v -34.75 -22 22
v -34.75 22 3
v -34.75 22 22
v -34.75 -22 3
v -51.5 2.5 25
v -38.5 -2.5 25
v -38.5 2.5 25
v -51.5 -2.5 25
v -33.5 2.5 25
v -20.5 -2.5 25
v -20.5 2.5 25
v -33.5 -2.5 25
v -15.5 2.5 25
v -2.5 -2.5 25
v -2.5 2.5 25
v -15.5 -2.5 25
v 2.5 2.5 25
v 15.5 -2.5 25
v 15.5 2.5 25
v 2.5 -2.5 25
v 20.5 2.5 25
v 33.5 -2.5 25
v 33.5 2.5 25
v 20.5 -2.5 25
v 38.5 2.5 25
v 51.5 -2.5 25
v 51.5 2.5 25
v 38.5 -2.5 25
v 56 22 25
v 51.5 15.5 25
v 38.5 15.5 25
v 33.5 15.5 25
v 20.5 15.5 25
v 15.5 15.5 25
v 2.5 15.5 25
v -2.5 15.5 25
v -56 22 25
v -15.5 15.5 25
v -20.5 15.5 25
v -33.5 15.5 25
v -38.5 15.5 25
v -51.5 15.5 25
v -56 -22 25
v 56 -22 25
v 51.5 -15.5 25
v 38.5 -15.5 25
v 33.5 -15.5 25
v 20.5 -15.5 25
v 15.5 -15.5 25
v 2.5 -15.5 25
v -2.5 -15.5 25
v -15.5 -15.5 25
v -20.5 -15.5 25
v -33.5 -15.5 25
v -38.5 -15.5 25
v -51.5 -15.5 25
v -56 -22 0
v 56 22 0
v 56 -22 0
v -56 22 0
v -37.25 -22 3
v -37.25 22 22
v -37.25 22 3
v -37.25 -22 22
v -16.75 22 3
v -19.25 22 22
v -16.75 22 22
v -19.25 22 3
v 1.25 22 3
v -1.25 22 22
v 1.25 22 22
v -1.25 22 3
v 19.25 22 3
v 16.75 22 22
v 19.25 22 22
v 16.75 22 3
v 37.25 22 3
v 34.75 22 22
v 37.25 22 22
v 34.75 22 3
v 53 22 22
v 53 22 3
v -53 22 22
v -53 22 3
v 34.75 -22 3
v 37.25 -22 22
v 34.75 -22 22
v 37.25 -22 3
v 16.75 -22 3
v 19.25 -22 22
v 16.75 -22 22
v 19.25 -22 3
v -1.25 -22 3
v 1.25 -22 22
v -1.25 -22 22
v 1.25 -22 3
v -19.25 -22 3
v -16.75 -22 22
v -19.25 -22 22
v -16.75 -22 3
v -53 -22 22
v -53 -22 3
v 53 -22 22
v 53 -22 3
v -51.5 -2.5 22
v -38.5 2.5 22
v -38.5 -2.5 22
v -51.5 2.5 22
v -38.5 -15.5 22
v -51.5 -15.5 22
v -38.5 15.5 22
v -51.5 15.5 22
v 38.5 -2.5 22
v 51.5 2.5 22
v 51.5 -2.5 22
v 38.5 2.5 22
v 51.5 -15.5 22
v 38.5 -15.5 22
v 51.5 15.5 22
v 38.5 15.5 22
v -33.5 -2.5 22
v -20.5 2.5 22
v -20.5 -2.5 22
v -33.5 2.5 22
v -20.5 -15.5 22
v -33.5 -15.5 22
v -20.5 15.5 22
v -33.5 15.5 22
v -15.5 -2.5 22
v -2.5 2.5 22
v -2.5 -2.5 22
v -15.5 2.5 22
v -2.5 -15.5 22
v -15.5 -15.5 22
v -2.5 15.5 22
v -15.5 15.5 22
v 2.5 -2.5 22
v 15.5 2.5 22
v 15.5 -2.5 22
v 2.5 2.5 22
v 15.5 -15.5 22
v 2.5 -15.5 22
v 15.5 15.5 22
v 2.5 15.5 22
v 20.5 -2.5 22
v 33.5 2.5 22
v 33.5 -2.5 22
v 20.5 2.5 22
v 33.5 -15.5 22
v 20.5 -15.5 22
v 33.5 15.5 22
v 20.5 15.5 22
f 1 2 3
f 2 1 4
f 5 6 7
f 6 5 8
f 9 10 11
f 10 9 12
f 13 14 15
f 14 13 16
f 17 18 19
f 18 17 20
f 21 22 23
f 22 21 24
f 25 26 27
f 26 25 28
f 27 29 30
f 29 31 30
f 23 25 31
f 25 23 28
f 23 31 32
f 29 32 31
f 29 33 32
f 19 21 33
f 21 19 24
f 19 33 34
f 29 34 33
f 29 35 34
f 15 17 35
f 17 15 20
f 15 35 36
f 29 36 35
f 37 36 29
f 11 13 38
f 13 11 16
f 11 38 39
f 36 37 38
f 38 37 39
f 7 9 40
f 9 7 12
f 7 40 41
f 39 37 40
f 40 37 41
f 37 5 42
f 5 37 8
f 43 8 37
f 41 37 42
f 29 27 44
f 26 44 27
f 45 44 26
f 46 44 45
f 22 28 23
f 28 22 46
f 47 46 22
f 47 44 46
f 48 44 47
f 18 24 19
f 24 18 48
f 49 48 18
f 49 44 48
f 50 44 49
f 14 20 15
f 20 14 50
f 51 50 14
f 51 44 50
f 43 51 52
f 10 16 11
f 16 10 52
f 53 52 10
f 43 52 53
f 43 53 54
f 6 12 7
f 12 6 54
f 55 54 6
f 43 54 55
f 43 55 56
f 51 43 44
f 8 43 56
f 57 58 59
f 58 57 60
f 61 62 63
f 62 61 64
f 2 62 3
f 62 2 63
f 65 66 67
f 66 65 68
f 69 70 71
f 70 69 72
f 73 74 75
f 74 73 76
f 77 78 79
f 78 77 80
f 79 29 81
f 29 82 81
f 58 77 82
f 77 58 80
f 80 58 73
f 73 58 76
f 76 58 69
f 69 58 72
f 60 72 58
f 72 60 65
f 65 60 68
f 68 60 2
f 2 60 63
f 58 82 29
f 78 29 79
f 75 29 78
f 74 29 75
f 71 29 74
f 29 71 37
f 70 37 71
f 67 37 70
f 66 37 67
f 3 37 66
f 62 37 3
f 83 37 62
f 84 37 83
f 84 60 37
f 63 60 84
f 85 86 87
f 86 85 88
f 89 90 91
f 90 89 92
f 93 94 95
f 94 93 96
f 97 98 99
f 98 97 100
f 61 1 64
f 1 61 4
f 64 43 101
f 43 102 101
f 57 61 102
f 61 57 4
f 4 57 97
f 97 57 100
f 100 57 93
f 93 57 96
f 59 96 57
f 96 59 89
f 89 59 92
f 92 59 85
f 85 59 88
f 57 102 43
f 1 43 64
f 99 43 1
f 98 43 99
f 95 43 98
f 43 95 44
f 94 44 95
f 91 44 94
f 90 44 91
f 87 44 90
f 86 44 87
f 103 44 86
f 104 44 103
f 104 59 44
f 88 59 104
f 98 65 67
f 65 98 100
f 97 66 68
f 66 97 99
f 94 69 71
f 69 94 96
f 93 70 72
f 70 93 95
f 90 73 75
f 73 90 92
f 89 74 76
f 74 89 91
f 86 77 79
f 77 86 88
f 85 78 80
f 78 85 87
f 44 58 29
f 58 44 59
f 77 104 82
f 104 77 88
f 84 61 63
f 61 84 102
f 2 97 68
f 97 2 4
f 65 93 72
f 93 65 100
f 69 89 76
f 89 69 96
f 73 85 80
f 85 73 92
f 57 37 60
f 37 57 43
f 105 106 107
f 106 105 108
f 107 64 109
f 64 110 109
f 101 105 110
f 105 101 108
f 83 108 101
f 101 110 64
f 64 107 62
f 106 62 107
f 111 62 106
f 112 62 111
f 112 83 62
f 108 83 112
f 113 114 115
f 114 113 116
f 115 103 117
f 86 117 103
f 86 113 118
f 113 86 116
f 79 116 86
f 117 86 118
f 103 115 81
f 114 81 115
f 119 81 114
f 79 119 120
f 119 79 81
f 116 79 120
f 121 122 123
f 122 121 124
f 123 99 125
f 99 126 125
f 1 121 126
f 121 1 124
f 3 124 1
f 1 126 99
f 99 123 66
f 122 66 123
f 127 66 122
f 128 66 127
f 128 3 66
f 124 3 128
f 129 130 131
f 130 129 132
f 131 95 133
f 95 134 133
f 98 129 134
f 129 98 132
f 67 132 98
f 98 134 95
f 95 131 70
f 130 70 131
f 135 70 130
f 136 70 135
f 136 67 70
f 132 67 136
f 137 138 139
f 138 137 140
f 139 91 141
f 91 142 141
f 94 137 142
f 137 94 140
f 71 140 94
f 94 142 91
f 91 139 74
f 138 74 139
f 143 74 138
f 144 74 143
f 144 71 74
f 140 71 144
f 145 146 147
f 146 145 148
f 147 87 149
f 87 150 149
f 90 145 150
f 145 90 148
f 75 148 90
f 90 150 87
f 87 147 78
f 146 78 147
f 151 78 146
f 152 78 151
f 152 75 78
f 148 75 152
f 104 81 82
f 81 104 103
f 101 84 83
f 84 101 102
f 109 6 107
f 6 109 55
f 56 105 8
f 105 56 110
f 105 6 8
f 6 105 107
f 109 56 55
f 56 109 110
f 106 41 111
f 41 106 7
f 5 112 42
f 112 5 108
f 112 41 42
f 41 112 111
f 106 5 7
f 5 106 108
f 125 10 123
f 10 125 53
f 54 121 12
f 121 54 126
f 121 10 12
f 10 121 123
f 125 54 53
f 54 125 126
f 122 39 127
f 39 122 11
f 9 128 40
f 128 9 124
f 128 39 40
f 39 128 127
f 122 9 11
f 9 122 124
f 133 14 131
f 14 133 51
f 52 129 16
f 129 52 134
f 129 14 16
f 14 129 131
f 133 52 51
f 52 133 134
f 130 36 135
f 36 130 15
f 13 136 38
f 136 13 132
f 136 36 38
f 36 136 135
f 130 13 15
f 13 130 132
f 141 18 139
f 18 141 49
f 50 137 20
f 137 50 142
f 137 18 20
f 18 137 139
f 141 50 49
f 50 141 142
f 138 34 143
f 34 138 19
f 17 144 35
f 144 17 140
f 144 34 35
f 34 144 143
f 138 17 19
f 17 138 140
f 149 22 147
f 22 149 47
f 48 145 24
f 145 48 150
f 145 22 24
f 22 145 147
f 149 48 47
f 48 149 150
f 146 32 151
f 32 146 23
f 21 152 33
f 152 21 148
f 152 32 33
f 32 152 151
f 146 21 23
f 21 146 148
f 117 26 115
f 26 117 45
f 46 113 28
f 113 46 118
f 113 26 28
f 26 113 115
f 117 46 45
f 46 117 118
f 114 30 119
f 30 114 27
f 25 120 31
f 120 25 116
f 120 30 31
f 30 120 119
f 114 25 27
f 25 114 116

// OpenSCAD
// Cuvette Rack for 12 standard 12.5mm square cuvettes
// Designed for FDM printing, standing on the base plate.

// --- Dimensions ---
base_x      = 112.0;   // Base plate length (X)
base_y      = 44.0;    // Base plate width (Y)
base_z      = 3.0;     // Base plate thickness
deck_z_min  = 22.0;    // Bottom of deck plate (Z)
deck_z_max  = 25.0;    // Top of deck plate (Z)
wall_thick  = 3.0;     // Thickness of end walls
rib_thick   = 2.5;     // Thickness of internal ribs
wall_height = 25.0;    // Total height of walls

// Hole dimensions
hole_size   = 13.0;    // Square hole size (X and Y)
hole_pitch  = 18.0;    // Center-to-center distance for holes (X and Y)
rows        = 2;       // Number of rows (Y direction)
cols        = 6;       // Number of columns (X direction)

// Rib positions (X coordinates)
rib_x_pos   = [-36, -18, 0, 18, 36];

$fn = 64;

// --- Helper Modules ---

module base_plate() {
    translate([-base_x/2, -base_y/2, 0])
        cube([base_x, base_y, base_z]);
}

module deck_plate() {
    translate([-base_x/2, -base_y/2, deck_z_min])
        cube([base_x, base_y, deck_z_max - deck_z_min]);
}

module end_wall() {
    // Flush with short ends (Y direction)
    cube([wall_thick, base_y, wall_height]);
}

module rib() {
    // Centered ribs
    cube([rib_thick, base_y, wall_height]);
}

module hole() {
    // Square through-hole for the cuvette
    // We use a small offset to ensure it cuts through the deck cleanly
    translate([-hole_size/2, -hole_size/2, deck_z_min - 0.1])
        cube([hole_size, hole_size, (deck_z_max - deck_z_min) + 0.2]);
}

// --- Main Assembly ---

difference() {
    // Positive Geometry
    union() {
        base_plate();
        deck_plate();
        
        // End walls (flush with short ends)
        translate([base_x/2 - wall_thick, -base_y/2, 0]) end_wall();
        translate([-base_x/2, -base_y/2, 0]) end_wall();
        
        // Internal ribs
        for (x_pos = rib_x_pos) {
            translate([x_pos - rib_thick/2, -base_y/2, 0]) rib();
        }
    }

    // Negative Geometry (Holes in the deck)
    // Calculate starting position to center the grid of holes on the deck
    // The grid is (cols-1)*pitch wide. 
    // Offset = (Total Width / 2) - (Grid Width / 2)
    grid_width_x = (cols - 1) * hole_pitch;
    grid_width_y = (rows - 1) * hole_pitch;
    
    start_x = (-grid_width_x / 2) + (hole_pitch / 2); // Error in logic? No, let's use the loop below.
    
    // Corrected centering logic:
    // The center of the first hole in the grid should be at:
    // (Center of plate) - (Total distance from center to first hole center)
    // Total distance from center to first hole center = (cols-1)*pitch / 2
    
    for (i = [0 : cols - 1]) {
        for (j = [0 : rows - 1]) {
            // Calculate center of current hole relative to origin
            cx = (i - (cols - 1) / 2) * hole_pitch;
            cy = (j - (rows - 1) / 2) * hole_pitch;
            
            translate([cx, cy, 0]) hole();
        }
    }
}
